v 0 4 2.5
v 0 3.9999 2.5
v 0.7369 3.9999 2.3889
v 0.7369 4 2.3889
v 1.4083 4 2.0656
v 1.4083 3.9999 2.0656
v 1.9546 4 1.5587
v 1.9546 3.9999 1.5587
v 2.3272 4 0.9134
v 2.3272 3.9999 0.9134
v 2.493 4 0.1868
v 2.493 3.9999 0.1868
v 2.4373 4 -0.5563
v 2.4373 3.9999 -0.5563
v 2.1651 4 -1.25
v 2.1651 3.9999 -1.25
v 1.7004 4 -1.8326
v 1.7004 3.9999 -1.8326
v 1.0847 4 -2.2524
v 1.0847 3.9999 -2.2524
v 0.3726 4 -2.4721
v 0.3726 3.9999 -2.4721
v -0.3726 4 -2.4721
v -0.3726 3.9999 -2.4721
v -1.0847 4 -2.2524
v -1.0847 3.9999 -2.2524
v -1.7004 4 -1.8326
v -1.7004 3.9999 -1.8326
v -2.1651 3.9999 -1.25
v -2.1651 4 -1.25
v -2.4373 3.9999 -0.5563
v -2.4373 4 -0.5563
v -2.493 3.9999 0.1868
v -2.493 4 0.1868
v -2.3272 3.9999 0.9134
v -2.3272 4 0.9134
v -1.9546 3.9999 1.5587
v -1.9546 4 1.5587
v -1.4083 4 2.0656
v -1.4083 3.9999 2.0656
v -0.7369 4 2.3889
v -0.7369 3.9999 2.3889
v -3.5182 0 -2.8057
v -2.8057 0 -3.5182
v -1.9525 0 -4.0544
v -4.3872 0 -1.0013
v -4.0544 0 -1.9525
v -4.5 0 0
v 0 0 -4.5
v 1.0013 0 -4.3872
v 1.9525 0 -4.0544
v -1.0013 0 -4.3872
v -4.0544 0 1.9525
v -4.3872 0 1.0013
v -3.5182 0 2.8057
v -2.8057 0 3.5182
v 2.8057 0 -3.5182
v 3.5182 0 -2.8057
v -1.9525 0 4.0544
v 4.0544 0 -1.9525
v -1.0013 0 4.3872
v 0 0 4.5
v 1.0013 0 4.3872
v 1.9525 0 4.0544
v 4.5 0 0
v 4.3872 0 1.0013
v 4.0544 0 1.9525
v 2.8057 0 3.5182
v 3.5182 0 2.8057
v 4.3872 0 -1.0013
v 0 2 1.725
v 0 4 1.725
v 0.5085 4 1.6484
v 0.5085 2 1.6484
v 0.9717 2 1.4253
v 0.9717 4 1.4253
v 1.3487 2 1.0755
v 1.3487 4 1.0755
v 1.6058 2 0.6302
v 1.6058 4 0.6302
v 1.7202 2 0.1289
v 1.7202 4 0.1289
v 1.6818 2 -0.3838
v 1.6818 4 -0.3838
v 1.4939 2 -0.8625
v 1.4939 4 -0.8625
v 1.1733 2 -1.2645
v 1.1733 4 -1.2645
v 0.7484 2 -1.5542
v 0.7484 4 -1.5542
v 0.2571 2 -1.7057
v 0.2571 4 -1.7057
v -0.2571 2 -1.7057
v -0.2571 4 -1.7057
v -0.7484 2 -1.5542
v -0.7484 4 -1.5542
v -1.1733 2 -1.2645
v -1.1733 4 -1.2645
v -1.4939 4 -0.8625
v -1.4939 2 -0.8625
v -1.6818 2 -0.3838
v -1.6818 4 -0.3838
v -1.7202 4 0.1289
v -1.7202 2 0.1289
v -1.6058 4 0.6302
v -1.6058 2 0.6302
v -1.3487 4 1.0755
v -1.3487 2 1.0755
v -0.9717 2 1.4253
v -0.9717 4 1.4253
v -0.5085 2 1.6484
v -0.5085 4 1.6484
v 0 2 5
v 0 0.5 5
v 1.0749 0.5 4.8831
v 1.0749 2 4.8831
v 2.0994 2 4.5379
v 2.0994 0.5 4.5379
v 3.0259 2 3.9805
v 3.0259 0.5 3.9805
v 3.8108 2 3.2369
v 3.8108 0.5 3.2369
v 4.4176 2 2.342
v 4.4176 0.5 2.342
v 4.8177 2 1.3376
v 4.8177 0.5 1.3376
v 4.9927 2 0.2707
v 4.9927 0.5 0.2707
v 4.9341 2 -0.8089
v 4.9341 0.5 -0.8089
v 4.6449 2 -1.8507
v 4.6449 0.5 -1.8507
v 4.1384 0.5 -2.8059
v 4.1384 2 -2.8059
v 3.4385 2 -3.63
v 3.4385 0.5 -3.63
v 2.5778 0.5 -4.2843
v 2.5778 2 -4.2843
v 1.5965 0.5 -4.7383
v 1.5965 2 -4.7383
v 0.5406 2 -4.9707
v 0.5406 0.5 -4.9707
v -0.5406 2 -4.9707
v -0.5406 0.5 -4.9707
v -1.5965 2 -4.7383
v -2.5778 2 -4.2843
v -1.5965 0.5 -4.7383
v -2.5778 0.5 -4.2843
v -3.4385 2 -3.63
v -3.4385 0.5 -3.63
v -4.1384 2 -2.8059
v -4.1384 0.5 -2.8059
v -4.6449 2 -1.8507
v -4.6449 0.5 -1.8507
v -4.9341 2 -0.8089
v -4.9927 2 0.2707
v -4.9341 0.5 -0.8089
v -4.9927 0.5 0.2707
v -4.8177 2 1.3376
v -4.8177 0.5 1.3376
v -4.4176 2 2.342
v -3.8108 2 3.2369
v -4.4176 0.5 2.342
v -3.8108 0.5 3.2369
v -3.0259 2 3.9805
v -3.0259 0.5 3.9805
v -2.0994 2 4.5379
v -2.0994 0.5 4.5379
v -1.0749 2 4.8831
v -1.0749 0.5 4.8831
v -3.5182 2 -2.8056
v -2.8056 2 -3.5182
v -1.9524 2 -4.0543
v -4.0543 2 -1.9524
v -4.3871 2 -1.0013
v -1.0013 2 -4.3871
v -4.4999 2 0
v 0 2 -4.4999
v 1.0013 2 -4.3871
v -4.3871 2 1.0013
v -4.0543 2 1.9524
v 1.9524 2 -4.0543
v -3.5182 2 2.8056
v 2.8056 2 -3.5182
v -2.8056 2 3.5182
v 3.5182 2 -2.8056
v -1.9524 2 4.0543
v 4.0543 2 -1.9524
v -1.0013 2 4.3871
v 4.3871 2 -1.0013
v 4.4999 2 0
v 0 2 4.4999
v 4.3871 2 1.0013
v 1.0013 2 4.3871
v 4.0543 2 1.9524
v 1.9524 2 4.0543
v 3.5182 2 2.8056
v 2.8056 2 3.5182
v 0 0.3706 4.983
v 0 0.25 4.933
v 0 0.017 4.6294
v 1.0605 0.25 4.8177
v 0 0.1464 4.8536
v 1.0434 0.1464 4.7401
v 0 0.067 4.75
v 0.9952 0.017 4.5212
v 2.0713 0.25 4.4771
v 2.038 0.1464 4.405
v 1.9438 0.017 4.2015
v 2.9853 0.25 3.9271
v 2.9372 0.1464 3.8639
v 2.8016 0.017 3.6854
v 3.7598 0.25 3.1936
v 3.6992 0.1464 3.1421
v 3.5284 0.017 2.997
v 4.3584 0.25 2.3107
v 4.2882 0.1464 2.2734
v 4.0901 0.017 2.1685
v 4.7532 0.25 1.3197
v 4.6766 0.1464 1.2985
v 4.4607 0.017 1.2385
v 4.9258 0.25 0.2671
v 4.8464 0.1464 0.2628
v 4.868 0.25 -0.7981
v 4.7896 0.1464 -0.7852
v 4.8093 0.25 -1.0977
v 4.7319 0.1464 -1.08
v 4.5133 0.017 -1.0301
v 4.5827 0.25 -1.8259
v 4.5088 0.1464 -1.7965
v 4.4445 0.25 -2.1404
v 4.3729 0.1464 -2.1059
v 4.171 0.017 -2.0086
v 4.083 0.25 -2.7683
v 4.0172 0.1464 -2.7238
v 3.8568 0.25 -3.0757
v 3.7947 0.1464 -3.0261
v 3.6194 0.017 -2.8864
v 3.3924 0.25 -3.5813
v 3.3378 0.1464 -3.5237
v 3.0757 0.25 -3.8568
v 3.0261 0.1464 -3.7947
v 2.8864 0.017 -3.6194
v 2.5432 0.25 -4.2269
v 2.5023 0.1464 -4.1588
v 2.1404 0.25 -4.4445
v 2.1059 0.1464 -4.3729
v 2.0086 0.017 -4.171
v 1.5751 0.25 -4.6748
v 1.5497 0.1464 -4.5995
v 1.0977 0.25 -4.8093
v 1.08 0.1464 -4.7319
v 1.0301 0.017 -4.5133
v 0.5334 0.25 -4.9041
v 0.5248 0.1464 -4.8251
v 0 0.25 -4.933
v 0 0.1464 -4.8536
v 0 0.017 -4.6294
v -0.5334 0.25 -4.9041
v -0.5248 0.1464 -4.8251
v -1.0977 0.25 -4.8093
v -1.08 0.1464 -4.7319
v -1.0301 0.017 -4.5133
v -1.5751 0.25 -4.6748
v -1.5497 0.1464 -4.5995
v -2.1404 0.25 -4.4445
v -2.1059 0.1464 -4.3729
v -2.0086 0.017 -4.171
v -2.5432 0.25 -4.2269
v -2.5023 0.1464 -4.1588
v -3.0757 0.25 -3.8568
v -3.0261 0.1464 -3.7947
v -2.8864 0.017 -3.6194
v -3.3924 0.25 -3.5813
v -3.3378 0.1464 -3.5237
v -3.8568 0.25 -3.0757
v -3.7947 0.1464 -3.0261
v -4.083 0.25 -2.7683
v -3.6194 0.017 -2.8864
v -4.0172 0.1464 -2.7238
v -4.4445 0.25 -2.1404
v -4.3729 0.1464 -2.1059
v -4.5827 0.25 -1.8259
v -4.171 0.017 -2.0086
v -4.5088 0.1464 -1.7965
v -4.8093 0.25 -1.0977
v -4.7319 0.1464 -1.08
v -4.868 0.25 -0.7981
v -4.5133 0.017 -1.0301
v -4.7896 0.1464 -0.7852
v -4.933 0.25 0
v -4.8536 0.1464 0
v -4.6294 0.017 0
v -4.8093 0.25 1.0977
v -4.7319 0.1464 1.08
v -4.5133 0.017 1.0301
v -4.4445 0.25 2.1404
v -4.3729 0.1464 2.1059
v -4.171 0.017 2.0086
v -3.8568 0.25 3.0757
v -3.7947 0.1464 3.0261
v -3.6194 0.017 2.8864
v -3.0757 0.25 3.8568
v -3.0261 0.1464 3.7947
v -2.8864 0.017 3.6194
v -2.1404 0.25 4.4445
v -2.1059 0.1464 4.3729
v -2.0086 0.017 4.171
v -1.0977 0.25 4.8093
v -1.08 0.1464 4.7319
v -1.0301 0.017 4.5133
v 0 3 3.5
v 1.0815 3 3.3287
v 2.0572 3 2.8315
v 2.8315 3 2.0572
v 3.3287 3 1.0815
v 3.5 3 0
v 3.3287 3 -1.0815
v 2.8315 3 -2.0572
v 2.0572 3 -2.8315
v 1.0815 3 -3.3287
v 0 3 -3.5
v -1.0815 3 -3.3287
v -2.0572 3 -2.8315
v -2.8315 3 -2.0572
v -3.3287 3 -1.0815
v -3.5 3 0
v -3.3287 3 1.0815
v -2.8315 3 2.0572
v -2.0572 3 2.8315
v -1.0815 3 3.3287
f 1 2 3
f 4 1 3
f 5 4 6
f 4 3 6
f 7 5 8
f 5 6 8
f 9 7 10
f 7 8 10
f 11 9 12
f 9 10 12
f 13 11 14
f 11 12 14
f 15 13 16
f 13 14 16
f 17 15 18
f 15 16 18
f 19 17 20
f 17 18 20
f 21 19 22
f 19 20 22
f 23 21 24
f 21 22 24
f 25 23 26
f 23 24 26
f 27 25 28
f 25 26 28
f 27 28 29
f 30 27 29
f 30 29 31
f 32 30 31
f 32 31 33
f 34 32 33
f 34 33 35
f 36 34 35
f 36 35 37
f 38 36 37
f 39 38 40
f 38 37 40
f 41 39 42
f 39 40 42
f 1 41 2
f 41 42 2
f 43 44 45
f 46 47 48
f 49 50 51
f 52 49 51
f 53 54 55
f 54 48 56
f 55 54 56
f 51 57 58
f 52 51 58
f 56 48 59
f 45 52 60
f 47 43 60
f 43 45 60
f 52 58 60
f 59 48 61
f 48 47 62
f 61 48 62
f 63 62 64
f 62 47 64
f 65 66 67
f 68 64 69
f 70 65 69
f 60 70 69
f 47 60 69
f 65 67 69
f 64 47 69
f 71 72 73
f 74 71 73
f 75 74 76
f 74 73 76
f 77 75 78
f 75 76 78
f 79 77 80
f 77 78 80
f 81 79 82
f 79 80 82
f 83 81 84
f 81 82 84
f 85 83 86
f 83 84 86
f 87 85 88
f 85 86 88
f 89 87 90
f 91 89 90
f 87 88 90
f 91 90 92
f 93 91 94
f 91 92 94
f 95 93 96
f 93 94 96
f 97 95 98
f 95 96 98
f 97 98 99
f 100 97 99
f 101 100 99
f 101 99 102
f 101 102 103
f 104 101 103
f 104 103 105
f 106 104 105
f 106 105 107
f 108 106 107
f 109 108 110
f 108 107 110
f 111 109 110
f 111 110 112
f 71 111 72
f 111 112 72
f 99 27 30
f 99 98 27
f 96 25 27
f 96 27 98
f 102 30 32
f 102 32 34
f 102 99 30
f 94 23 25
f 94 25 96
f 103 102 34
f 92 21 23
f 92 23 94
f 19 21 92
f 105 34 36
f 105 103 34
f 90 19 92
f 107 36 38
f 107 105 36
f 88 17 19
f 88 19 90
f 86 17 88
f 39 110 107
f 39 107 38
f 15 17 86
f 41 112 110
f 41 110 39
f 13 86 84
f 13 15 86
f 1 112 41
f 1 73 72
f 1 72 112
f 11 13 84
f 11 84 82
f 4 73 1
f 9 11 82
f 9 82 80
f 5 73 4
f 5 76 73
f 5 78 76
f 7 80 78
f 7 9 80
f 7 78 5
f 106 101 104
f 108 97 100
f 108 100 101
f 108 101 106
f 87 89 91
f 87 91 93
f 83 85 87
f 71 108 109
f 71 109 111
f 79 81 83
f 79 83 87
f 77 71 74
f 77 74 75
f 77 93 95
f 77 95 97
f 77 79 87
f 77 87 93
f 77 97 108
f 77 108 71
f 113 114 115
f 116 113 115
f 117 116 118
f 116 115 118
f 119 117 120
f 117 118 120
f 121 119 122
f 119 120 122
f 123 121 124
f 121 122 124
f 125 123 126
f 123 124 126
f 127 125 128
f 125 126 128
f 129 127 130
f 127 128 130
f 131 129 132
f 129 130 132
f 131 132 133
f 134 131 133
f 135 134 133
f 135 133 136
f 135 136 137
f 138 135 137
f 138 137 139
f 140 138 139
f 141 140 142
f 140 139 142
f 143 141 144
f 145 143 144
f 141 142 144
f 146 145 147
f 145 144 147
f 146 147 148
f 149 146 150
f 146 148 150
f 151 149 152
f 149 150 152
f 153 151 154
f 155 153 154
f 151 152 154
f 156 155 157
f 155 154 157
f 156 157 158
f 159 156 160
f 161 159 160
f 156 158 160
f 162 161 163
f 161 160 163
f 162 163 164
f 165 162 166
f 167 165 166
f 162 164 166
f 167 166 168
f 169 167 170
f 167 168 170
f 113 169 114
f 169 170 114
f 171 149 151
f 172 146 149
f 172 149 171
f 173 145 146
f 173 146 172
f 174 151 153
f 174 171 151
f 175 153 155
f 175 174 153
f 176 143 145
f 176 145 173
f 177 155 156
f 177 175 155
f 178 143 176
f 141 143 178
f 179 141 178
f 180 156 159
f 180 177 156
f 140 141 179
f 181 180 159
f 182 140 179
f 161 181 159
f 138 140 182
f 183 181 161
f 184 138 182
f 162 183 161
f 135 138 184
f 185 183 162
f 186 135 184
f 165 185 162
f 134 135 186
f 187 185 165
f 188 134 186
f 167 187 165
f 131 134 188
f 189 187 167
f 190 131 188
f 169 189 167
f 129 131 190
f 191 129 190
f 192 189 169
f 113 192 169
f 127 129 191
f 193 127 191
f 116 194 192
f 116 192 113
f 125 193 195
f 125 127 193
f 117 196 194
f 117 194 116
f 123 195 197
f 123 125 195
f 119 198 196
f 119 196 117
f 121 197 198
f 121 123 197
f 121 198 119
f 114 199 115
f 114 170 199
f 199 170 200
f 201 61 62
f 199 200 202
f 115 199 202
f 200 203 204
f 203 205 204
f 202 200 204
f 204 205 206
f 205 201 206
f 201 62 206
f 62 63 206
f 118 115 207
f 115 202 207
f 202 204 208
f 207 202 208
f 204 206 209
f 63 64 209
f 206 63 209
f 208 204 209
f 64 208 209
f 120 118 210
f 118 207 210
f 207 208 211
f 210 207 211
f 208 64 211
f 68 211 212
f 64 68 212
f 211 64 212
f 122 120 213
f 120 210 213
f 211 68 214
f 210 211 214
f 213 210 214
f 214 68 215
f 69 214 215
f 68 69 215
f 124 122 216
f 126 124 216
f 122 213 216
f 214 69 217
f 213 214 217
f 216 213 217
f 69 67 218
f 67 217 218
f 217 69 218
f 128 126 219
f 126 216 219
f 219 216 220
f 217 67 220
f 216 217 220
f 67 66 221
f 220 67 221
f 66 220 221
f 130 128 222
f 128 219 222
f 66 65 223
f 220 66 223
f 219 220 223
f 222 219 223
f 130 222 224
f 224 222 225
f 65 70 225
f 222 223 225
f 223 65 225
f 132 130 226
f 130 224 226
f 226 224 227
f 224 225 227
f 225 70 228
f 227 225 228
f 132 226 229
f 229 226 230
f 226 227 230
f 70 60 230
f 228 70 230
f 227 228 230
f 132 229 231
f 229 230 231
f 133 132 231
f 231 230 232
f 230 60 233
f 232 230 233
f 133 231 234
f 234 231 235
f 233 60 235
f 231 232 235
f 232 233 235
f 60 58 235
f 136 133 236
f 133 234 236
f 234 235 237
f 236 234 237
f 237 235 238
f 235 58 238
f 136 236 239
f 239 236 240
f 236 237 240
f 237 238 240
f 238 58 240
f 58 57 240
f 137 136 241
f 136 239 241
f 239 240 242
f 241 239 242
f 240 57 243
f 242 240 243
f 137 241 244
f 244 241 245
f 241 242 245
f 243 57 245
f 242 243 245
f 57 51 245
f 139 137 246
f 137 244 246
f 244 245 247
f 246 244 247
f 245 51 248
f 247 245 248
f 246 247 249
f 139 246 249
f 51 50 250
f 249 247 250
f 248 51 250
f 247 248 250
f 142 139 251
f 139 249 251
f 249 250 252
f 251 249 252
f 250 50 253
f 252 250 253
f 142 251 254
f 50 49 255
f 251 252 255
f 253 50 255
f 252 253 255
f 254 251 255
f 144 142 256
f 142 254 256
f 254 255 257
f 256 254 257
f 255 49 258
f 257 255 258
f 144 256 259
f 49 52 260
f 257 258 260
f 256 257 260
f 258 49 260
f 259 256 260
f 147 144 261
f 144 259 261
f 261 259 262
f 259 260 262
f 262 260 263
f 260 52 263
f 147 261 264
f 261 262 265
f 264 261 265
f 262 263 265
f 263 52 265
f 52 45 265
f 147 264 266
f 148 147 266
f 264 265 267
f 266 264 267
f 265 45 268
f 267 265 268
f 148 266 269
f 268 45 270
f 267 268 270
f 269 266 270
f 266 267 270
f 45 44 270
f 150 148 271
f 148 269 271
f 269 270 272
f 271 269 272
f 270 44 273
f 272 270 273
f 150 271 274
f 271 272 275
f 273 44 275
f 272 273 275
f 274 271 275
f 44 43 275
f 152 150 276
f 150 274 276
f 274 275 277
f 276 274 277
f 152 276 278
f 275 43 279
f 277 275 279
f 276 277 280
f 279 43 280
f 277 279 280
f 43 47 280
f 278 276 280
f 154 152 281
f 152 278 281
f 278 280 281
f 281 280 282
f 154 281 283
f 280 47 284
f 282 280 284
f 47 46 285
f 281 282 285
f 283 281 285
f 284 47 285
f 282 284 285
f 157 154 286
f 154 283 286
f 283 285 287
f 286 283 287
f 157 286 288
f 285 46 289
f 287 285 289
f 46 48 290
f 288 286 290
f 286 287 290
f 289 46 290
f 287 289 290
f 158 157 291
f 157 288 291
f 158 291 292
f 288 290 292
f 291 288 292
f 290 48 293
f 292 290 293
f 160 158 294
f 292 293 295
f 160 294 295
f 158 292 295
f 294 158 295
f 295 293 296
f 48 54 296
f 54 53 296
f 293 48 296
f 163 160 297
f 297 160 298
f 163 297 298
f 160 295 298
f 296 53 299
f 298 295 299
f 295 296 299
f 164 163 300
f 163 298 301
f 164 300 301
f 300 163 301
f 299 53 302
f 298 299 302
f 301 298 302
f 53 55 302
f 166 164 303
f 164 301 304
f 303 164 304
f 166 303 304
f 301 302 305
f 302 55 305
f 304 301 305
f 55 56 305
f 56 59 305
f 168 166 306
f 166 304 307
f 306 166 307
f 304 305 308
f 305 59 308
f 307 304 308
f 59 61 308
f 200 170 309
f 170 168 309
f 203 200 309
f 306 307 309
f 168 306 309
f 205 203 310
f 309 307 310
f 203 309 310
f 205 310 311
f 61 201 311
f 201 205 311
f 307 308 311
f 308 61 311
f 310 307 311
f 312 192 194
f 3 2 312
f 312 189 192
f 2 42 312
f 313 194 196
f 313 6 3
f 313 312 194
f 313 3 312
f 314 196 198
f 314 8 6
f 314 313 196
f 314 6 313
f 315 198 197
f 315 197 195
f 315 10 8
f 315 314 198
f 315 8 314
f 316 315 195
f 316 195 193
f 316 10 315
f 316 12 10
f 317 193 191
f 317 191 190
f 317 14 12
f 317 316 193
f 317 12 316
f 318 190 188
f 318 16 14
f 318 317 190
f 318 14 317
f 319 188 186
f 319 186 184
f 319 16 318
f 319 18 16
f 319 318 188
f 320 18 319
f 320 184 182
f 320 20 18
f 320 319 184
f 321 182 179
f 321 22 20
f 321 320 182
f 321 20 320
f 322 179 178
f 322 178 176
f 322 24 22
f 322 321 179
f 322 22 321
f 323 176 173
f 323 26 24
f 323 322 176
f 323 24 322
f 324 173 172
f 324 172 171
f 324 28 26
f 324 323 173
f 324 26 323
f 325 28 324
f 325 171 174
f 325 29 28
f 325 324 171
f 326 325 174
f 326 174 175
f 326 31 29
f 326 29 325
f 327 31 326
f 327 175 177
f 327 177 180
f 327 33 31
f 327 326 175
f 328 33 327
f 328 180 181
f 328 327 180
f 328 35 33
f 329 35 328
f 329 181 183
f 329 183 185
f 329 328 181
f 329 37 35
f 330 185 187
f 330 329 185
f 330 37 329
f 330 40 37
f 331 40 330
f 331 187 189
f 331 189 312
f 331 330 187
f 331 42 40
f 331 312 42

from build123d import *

# Parameters (mm, degrees)
ESBO_O1_R                = 5
RESSALTO_EXTRUS_O1_DEPTH = 2
ESBO_O2_R                = 2.5
RESSALTO_EXTRUS_O2_DEPTH = 2
ESBO_O3_R                = 1.725
CORTE_EXTRUS_O1_DEPTH    = 2
CHANFRO1_SIZE            = 2
FILETE1_R                = 0.5


with BuildPart() as part:
    # Esboço1 → Ressalto-extrusão1 (new body)
    with BuildSketch(Plane(origin=(0, 0, 0), x_dir=(1, 0, 0), z_dir=(0, 1, 0))):
        with Locations(Location((0, 0, 0), (0, 0, 270))):
            Circle(ESBO_O1_R)
    extrude(amount=RESSALTO_EXTRUS_O1_DEPTH)

    # Esboço2 → Ressalto-extrusão2 (add)
    with BuildSketch(Plane(origin=(0, 2, 0), x_dir=(1, 0, 0), z_dir=(0, 1, 0))):
        with Locations(Location((0, 0, 0), (0, 0, 270))):
            Circle(ESBO_O2_R)
    extrude(amount=RESSALTO_EXTRUS_O2_DEPTH)

    # Esboço3 → Corte-extrusão1 (cut)
    with BuildSketch(Plane(origin=(0, 4, 0), x_dir=(1, 0, 0), z_dir=(0, 1, 0))):
        with Locations(Location((0, 0, 0), (0, 0, 270))):
            Circle(ESBO_O3_R)
    extrude(amount=-CORTE_EXTRUS_O1_DEPTH, mode=Mode.SUBTRACT)

    # Chanfro1
    chanfro1_edges = [part.edges().sort_by_distance(p)[0] for p in [
        (0, 2, -2.5),
    ]]
    chamfer(chanfro1_edges, length=CHANFRO1_SIZE - 0.0001)  # a hair under: the kernel refuses the full size

    # Filete1
    filete1_edges = [part.edges().sort_by_distance(p)[0] for p in [
        (0, 0, -5),
    ]]
    fillet(filete1_edges, radius=FILETE1_R)


solid = part.part
